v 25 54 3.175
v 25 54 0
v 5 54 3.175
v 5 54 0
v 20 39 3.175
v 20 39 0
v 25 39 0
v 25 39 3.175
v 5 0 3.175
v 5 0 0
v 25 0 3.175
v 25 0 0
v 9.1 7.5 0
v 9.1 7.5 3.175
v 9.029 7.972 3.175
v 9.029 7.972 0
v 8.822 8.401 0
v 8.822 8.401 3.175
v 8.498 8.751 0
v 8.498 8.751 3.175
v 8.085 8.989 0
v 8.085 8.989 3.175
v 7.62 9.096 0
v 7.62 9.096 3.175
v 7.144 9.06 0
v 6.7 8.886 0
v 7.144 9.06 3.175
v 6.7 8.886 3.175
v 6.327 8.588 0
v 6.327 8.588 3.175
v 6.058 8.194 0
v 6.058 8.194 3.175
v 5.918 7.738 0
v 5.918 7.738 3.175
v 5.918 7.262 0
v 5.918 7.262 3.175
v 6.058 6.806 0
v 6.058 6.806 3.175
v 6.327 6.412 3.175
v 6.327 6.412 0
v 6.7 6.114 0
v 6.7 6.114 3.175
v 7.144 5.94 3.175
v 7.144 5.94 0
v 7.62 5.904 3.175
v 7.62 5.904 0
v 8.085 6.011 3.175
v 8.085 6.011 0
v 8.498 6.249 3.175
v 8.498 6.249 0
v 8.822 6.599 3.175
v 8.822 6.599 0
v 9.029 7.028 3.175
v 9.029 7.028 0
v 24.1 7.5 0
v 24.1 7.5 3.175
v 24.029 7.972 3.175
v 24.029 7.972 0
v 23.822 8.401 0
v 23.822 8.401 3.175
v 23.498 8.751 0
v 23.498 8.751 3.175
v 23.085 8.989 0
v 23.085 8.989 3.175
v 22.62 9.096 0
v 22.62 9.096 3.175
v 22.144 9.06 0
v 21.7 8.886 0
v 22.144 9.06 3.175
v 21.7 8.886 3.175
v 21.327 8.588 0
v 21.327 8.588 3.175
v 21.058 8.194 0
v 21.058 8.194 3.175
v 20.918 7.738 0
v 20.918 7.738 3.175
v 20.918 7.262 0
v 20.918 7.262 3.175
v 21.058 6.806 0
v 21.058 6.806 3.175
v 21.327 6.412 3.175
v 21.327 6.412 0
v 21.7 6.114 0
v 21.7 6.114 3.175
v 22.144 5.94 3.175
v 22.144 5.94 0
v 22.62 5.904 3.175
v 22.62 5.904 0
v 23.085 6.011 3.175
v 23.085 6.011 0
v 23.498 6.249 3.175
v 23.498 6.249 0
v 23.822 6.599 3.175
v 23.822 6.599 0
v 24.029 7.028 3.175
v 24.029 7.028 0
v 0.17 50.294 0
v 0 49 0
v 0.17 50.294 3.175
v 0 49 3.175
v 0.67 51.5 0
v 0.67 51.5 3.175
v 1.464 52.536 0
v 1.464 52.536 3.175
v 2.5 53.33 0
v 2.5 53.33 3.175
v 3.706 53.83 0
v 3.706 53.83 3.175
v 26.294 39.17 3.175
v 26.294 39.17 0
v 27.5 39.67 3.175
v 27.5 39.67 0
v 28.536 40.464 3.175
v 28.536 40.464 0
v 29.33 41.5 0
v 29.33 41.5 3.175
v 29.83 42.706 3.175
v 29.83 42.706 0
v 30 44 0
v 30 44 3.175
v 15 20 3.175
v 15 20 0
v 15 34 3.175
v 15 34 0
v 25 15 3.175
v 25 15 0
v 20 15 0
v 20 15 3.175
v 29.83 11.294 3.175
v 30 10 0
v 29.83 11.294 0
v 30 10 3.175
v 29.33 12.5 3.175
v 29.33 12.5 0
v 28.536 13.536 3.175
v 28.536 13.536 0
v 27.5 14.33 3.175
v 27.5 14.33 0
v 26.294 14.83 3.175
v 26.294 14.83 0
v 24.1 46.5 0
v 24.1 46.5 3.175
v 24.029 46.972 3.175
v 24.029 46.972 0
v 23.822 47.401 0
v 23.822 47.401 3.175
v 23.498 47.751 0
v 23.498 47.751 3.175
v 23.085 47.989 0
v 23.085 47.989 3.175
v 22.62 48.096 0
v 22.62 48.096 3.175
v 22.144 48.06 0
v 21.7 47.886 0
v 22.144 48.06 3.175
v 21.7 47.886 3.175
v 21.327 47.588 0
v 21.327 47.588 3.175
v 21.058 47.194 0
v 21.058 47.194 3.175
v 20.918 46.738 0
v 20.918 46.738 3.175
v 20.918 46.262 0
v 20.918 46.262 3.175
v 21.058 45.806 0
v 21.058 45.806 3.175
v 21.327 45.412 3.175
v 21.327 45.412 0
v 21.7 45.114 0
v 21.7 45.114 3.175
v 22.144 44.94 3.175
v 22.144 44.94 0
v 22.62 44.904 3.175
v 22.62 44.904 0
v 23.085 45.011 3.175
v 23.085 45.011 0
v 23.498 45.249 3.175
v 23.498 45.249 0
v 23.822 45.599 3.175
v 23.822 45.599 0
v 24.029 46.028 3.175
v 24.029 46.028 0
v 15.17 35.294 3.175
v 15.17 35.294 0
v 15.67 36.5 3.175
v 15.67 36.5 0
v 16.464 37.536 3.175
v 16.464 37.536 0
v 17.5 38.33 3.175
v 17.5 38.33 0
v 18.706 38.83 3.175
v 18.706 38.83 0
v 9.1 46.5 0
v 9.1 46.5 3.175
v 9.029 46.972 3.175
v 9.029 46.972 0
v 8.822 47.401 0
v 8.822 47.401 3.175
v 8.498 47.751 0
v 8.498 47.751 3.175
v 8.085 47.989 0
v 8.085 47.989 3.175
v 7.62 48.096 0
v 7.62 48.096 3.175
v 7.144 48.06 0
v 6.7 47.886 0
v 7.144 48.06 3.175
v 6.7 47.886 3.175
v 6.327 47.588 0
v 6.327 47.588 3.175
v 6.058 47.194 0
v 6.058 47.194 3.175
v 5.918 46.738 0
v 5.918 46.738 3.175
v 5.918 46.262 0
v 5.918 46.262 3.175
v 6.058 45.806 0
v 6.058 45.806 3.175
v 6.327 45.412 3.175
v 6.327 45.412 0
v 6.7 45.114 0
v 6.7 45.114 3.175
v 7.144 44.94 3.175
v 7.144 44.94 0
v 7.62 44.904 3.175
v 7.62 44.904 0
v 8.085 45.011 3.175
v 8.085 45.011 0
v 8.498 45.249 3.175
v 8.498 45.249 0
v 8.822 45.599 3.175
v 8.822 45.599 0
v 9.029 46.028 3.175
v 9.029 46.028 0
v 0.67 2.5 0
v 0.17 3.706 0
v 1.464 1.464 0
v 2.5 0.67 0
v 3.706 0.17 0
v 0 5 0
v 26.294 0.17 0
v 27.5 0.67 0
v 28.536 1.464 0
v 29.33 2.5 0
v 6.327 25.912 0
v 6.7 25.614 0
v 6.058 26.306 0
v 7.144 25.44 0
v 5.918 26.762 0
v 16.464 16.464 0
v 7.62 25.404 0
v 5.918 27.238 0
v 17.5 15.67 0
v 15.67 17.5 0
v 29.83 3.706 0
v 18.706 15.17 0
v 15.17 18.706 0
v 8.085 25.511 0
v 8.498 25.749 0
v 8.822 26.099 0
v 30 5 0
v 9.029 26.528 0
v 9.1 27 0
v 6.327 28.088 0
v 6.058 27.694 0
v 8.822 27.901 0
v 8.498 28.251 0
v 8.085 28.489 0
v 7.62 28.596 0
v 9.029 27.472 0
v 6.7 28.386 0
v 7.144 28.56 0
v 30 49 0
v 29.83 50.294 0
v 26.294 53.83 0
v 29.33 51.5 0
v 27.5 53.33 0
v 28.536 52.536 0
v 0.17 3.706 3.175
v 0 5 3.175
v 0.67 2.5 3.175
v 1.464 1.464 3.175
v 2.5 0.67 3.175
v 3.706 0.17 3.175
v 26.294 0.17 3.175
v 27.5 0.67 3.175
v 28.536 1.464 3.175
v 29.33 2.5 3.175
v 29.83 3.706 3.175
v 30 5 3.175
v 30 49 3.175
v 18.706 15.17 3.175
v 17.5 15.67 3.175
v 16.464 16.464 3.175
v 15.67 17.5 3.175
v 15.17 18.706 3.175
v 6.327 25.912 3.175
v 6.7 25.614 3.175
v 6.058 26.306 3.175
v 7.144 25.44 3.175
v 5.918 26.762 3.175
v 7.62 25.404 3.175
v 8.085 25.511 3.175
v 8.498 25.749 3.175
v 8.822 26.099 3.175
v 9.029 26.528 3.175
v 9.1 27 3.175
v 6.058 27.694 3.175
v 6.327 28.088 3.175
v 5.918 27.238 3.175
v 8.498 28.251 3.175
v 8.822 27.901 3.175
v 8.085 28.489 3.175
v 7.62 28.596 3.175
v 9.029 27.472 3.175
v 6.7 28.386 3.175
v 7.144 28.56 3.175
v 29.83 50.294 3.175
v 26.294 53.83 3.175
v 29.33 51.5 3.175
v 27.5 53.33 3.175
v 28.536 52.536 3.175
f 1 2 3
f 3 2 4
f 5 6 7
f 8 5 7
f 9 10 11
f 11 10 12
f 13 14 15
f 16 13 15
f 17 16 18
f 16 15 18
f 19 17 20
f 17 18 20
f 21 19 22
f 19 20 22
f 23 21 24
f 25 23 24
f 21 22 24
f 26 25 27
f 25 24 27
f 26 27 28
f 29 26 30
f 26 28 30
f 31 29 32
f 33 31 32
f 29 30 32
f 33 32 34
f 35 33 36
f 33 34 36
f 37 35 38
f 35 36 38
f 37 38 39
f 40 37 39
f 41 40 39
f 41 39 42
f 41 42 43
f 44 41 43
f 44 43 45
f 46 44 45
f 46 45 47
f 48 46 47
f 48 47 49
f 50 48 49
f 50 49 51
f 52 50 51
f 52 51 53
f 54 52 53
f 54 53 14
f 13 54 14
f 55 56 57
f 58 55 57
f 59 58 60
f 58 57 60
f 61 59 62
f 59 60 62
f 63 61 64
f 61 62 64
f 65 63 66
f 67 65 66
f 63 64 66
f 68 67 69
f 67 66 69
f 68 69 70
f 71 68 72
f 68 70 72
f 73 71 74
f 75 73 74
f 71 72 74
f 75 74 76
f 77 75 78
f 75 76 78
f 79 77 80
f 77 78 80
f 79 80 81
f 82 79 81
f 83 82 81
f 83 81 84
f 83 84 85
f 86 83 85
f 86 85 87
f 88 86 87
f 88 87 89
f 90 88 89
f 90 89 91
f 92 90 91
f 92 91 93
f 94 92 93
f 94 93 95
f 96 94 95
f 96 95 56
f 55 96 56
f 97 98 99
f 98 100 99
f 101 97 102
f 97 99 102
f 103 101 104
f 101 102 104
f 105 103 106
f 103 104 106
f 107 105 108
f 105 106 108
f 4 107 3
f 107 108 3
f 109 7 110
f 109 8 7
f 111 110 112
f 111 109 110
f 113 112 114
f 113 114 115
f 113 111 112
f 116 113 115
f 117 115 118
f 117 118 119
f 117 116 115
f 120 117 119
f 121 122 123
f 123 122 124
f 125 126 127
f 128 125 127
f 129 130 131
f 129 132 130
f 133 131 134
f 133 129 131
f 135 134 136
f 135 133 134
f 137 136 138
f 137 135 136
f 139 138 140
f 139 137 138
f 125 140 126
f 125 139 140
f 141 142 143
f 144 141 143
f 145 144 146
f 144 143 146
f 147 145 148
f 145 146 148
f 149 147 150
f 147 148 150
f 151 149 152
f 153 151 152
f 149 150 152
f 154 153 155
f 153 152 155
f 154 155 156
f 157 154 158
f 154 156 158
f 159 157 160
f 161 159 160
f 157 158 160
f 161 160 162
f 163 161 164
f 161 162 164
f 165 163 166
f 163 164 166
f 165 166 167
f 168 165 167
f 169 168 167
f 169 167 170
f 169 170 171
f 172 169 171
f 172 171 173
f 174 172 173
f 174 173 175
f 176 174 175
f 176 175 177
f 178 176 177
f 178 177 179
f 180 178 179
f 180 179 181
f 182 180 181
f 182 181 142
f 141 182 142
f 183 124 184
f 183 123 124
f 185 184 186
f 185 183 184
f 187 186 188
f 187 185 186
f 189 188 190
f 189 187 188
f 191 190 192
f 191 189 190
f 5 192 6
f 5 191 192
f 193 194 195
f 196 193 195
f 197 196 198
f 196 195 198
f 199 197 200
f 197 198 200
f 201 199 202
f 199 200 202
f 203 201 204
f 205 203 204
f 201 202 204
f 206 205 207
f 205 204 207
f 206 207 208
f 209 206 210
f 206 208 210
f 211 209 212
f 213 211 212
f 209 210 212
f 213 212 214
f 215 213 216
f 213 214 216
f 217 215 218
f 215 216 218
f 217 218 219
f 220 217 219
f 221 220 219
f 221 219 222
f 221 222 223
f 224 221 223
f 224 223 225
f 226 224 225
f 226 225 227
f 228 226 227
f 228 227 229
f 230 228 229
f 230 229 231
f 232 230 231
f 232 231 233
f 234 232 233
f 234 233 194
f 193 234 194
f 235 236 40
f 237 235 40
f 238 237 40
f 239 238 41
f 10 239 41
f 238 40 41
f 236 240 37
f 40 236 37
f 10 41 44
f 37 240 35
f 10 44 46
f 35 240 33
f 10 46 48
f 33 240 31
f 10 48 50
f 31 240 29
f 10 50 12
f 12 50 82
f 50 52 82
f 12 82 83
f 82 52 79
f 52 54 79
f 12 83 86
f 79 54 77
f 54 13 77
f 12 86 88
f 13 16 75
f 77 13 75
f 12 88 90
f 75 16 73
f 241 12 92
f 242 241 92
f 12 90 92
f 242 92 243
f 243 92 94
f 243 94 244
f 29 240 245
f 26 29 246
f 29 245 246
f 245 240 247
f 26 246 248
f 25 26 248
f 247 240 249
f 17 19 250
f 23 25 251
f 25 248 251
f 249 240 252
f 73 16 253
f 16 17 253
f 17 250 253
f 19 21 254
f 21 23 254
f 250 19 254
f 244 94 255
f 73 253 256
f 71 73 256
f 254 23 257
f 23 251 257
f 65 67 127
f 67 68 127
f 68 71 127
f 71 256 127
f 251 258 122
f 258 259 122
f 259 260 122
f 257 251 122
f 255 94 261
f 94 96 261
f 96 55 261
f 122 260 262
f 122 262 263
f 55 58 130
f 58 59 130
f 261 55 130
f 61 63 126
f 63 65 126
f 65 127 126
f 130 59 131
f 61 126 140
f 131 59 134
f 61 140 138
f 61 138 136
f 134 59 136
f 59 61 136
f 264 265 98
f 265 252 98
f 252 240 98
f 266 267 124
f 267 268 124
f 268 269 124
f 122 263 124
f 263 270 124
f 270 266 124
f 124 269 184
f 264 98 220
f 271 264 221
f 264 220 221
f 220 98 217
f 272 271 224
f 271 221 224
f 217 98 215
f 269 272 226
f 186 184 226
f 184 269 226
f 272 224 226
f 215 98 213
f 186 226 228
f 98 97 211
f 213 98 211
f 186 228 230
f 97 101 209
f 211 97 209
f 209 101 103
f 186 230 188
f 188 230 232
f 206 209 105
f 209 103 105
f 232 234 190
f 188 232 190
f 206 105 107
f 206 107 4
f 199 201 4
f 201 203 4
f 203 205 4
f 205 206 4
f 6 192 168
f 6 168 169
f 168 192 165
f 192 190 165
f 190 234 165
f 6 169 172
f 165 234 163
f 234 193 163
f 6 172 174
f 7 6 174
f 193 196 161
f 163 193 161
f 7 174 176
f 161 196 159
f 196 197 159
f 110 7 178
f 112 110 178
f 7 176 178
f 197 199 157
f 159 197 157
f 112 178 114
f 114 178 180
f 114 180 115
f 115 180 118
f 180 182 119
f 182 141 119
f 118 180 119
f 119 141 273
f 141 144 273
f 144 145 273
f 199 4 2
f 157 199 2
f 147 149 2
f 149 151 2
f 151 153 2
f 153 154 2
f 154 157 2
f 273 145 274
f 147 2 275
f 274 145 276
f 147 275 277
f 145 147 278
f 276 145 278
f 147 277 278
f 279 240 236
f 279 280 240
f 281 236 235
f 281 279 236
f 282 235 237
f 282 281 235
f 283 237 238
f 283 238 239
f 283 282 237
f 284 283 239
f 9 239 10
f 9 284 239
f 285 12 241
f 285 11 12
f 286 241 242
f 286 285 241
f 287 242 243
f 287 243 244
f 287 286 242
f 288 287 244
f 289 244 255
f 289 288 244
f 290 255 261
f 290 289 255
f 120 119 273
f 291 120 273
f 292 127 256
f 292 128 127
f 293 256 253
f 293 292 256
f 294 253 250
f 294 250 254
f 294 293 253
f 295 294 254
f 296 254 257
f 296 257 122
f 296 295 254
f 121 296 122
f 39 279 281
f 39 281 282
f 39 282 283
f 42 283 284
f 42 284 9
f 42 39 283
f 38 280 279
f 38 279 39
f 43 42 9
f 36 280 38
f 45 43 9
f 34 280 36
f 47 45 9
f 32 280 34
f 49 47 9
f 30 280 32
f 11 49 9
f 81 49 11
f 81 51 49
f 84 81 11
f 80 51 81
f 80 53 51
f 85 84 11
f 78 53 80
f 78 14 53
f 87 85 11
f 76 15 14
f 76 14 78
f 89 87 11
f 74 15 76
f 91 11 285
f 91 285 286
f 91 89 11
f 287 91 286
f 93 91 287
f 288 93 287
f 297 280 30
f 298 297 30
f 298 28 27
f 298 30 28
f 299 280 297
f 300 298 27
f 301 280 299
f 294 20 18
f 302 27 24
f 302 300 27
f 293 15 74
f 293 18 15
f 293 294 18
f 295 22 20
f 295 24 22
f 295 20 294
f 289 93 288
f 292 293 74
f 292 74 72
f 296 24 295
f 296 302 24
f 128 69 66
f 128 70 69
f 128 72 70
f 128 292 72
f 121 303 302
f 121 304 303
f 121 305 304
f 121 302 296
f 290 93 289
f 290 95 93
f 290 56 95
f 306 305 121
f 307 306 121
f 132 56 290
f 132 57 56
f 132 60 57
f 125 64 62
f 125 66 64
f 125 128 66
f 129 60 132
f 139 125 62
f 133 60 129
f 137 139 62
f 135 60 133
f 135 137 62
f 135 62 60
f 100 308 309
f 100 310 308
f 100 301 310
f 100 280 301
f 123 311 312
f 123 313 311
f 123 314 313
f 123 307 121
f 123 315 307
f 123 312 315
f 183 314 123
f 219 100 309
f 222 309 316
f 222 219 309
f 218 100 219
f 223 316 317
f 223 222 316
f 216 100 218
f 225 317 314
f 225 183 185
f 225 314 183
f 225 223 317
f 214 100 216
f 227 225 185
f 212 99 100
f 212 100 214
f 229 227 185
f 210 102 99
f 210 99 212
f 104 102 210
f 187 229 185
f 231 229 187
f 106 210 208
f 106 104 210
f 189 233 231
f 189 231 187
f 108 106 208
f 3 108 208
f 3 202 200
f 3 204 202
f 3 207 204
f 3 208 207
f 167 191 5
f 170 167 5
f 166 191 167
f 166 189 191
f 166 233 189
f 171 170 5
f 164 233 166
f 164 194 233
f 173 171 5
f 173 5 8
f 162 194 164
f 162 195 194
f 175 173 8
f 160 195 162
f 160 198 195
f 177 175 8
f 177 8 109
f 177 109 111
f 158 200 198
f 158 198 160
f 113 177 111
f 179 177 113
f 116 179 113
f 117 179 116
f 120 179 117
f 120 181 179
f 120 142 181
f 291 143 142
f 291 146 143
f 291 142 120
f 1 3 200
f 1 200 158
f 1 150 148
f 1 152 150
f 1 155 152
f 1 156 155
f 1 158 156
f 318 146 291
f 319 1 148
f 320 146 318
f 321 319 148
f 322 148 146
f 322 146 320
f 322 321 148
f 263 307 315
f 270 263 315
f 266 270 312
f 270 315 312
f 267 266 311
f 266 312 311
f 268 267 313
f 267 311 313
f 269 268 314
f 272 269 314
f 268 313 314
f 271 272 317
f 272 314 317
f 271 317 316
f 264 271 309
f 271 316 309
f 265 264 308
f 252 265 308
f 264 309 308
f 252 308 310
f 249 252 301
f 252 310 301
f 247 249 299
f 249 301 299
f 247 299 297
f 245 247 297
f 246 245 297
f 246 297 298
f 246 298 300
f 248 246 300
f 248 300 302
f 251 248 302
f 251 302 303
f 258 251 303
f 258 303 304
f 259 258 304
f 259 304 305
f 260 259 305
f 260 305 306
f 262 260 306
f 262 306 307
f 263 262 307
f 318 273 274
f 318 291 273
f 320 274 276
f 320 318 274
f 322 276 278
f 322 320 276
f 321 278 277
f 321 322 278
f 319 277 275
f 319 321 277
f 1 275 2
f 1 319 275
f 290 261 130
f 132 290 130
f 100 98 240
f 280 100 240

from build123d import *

# Parameters (mm, degrees)
BOSS_EXTRUDE1_DEPTH = 3.175
FILLET1_R           = 5
SKETCH2_R           = 1.6
CUT_EXTRUDE1_DEPTH  = 4.175


with BuildPart() as part:
    # Sketch1 → Boss-Extrude1 (new body)
    with BuildSketch(Plane.XY):
        Polygon((0, 54), (0, 0), (30, 0), (30, 15), (15, 15), (15, 39), (30, 39), (30, 54), align=None)
    extrude(amount=BOSS_EXTRUDE1_DEPTH)

    # Fillet1
    fillet1_edges = [part.edges().sort_by_distance(p)[0] for p in [
        (15, 15, 1.5875),
        (30, 15, 1.5875),
        (30, 0, 1.5875),
        (0, 0, 1.5875),
        (0, 54, 1.5875),
        (30, 54, 1.5875),
        (30, 39, 1.5875),
        (15, 39, 1.5875),
    ]]
    fillet(fillet1_edges, radius=FILLET1_R)

    # Sketch2 → Cut-Extrude1 (cut, through all)
    with BuildSketch(Plane.XY.offset(3.175)):
        with Locations((7.5, 7.5)):
            Circle(SKETCH2_R)
        with Locations((7.5, 46.5)):
            Circle(SKETCH2_R)
        with Locations((22.5, 7.5)):
            Circle(SKETCH2_R)
        with Locations((7.5, 27)):
            Circle(SKETCH2_R)
        with Locations((22.5, 46.5)):
            Circle(SKETCH2_R)
    extrude(amount=-CUT_EXTRUDE1_DEPTH, mode=Mode.SUBTRACT)


solid = part.part
